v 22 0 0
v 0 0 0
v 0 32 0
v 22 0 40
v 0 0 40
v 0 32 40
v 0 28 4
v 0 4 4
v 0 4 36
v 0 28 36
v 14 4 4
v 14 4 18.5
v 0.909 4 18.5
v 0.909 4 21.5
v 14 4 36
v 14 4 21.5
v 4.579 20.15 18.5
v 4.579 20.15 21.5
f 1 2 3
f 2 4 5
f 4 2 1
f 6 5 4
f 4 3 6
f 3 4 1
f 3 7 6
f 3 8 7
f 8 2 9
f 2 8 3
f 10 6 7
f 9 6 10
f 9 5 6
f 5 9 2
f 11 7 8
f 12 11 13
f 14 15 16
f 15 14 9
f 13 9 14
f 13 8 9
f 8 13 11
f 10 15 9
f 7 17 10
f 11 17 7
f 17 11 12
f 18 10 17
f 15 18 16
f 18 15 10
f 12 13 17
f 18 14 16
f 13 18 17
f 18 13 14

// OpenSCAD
/* /!\ l'épaisseur du plan incliné n'est pas exactement celle de epaisseur_base.*/

cote1=22;
cote2=32;
epaisseur_triangles=4;
largeur=40;
epaisseur_base=4;

module triangle(c1,c2,ep)
{
linear_extrude(height=ep)
	polygon(points=[[0,0],[c1,0],[0,c2]]);
}

//translate([0,0,100*$t])
union()
{
difference()
{
	triangle(cote1,cote2,largeur);
	translate([0,epaisseur_base,epaisseur_triangles])
		triangle(cote1-2*epaisseur_base,cote2-2*epaisseur_base,largeur-2*epaisseur_triangles);
}
translate([0,0,(largeur-3)/2])
	linear_extrude(height=3)
		polygon(points=[[0,0],[cote1,0],[5,cote2-10]]);
}
